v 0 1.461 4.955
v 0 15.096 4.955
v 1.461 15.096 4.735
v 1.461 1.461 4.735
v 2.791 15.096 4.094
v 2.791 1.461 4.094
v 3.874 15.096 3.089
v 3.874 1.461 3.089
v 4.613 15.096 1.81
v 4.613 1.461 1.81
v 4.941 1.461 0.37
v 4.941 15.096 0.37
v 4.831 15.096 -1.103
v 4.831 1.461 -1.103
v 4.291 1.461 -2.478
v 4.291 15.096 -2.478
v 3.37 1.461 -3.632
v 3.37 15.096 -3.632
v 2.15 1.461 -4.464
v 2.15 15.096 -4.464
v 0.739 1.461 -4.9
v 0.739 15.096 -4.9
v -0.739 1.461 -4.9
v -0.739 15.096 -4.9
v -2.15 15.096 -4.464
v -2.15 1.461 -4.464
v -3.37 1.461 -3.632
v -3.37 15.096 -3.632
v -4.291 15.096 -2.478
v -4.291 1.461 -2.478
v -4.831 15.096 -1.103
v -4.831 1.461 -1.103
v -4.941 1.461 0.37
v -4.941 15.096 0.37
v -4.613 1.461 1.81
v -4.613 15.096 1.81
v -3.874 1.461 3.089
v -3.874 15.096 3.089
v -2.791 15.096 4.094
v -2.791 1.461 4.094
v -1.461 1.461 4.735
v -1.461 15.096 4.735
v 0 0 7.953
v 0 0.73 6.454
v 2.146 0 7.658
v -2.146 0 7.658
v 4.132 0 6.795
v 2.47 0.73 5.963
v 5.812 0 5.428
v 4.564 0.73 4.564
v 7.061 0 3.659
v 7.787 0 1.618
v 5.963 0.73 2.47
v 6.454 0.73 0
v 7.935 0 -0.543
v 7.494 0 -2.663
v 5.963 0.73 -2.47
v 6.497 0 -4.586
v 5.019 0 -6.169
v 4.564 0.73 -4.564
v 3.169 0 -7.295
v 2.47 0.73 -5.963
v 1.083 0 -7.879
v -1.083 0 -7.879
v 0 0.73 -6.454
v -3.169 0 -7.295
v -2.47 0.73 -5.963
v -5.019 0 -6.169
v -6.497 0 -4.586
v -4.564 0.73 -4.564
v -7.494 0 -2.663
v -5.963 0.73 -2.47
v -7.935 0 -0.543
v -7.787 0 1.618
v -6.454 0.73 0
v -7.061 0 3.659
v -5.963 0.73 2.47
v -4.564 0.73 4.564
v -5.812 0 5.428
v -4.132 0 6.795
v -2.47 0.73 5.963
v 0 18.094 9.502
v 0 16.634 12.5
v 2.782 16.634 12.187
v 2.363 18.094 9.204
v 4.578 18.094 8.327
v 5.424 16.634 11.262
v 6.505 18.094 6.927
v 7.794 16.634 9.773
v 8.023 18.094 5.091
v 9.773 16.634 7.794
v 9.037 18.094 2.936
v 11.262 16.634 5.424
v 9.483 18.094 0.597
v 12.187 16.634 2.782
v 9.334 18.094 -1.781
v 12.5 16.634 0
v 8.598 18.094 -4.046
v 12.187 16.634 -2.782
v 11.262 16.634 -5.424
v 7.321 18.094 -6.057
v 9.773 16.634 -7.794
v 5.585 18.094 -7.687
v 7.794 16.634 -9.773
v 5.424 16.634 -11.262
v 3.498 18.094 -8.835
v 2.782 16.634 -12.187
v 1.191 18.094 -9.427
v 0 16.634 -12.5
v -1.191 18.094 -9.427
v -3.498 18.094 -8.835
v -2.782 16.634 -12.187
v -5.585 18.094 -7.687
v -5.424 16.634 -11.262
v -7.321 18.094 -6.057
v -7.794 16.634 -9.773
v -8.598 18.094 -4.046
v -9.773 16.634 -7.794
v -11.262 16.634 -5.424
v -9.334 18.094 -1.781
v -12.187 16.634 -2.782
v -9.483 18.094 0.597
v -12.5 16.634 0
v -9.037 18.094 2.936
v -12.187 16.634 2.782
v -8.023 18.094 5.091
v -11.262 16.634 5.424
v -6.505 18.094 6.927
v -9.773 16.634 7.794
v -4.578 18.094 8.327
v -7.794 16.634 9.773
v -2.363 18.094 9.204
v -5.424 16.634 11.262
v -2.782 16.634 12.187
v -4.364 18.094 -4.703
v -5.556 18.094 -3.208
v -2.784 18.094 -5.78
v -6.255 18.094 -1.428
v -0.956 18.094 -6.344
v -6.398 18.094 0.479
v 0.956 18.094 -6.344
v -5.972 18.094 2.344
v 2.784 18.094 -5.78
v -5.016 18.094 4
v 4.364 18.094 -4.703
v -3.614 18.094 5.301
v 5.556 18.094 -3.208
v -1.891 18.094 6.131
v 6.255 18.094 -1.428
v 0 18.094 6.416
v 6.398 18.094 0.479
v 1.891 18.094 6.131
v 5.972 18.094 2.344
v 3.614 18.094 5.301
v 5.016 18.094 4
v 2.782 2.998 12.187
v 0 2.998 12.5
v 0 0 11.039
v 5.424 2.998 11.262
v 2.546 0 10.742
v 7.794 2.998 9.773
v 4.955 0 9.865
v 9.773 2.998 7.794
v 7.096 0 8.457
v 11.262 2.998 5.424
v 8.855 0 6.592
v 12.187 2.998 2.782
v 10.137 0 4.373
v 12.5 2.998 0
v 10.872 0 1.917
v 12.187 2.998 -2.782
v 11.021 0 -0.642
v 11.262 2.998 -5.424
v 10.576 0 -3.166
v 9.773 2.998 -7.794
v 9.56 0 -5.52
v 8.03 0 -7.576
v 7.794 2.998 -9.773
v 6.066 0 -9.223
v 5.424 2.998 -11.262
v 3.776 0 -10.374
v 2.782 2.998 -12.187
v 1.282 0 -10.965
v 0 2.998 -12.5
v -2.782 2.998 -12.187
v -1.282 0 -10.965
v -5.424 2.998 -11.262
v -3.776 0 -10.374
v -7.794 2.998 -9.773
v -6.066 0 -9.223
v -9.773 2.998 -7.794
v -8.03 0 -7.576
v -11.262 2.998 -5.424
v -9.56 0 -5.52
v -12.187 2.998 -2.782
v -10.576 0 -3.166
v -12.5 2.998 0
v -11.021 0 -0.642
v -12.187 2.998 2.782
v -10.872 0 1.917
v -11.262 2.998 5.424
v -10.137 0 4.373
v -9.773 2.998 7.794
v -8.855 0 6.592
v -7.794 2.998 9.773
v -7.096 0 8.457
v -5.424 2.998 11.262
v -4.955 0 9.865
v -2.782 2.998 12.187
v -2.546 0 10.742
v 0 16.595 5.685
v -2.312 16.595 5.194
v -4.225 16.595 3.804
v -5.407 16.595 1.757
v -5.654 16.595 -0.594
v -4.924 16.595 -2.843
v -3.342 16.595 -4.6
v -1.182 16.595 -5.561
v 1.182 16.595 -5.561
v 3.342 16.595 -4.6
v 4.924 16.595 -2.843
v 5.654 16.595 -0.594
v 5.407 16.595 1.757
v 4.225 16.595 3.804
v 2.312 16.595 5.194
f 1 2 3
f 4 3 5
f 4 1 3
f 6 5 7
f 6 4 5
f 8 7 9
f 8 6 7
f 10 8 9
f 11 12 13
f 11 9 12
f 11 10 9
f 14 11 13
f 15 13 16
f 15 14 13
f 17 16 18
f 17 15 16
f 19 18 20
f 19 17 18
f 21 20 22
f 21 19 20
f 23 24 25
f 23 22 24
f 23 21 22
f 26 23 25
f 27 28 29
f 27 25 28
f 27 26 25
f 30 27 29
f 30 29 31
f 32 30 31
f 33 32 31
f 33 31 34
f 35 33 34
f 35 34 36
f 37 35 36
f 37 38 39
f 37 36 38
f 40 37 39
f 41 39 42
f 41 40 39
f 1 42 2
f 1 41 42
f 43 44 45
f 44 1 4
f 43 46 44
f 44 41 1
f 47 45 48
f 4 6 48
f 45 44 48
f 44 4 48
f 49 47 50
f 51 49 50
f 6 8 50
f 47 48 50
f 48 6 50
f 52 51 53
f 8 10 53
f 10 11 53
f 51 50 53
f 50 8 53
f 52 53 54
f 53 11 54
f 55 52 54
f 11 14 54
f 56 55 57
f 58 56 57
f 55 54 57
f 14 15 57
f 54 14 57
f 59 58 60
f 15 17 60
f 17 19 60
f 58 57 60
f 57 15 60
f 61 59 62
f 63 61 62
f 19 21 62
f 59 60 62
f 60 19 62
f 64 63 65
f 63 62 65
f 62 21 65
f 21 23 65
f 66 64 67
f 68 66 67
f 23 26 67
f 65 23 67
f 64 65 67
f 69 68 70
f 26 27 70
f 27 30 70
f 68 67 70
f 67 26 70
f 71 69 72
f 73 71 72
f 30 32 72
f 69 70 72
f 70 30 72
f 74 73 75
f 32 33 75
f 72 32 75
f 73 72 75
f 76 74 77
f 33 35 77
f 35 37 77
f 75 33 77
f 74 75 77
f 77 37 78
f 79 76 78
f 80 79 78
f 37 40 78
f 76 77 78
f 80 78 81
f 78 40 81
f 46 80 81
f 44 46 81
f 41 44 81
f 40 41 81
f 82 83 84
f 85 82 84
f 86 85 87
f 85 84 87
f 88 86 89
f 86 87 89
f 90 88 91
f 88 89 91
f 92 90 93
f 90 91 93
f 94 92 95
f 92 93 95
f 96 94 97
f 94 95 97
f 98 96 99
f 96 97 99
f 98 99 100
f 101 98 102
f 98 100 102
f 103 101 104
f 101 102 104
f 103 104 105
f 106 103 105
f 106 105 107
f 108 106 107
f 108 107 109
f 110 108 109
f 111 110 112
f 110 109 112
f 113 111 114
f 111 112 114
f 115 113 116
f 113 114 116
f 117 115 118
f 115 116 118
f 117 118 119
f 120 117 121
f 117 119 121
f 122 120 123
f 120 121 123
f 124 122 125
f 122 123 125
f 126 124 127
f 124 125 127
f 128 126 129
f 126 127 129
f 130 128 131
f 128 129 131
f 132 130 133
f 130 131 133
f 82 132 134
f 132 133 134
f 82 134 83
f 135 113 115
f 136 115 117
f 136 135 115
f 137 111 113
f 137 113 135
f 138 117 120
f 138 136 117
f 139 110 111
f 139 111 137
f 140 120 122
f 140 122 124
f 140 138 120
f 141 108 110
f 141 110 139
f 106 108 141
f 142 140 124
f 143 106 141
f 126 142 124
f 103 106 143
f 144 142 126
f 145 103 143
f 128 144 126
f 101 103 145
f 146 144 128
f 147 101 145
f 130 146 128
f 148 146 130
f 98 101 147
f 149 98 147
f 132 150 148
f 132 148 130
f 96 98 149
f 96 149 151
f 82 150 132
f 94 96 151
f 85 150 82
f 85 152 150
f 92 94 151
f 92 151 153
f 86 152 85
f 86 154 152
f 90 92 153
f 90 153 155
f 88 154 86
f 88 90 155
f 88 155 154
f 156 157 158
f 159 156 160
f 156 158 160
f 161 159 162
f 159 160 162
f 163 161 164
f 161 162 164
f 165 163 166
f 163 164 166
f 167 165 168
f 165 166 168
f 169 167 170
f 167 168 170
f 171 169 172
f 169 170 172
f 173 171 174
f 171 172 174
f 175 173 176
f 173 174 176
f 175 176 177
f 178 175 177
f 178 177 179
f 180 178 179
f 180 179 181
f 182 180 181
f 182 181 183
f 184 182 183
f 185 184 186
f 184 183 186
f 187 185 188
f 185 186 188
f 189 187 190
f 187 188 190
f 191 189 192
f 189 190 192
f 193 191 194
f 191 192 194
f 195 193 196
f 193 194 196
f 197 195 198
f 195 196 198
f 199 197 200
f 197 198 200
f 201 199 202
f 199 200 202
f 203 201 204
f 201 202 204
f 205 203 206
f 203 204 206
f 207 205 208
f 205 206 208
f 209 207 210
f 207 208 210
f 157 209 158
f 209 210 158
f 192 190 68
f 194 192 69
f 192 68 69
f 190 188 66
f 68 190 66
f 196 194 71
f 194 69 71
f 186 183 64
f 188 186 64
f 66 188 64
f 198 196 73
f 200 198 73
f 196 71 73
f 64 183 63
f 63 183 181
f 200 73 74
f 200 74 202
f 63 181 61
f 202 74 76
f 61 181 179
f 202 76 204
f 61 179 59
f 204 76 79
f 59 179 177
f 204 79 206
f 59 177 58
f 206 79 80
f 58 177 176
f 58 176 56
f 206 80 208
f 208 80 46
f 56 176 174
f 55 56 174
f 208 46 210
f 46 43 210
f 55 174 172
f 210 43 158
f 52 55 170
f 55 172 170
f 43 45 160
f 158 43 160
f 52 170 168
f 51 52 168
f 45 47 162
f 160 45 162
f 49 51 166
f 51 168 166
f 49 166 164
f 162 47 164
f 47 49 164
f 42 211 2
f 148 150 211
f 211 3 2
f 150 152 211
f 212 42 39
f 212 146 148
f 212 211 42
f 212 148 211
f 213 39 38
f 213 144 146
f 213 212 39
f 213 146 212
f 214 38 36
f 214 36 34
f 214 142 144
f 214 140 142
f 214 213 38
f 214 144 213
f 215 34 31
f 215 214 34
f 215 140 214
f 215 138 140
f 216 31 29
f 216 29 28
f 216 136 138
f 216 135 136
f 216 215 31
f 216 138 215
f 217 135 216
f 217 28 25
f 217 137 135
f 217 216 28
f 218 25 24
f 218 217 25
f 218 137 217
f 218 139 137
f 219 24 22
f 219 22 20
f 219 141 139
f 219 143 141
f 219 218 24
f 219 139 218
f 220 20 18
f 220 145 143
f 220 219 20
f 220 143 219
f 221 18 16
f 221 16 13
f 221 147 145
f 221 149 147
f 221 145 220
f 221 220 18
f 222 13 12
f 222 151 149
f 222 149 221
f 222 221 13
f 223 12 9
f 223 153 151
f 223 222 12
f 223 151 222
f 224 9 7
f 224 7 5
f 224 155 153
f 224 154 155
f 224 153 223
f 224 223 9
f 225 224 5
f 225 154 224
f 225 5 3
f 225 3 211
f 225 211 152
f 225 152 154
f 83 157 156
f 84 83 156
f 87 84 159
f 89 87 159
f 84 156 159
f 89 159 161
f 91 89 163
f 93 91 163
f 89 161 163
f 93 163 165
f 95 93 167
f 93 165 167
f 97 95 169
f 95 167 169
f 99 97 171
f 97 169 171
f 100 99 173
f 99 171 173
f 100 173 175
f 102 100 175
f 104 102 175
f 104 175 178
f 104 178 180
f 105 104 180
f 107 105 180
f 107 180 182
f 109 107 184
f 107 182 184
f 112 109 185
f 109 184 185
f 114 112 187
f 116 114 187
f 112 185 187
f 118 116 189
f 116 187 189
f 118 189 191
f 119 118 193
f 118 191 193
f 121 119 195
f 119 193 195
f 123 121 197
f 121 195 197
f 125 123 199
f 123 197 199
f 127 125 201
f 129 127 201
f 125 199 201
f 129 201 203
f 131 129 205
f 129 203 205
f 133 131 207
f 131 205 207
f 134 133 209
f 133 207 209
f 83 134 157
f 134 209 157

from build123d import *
from OCP.BRepFilletAPI import BRepFilletAPI_MakeChamfer

# Parameters (mm, degrees)
SKETCH1_R           = 12.5
BOSS_EXTRUDE1_DEPTH = 18.094022058
SKETCH2_R           = 4.955152252
CUT_EXTRUDE1_DEPTH  = 26.296118956
CHAMFER1_SIZE       = 1.460521096
CHAMFER1_SIZE2      = 2.997964707


with BuildPart() as part:
    # Sketch1 → Boss-Extrude1 (new body)
    with BuildSketch(Plane(origin=(0, 0, 0), x_dir=(1, 0, 0), z_dir=(0, 1, 0))):
        Circle(SKETCH1_R)
    extrude(amount=BOSS_EXTRUDE1_DEPTH)

    # Sketch2 → Cut-Extrude1 (cut, through all)
    with BuildSketch(Plane(origin=(0, 0, 0), x_dir=(1, 0, 0), z_dir=(0, 1, 0))):
        Circle(SKETCH2_R)
    extrude(amount=CUT_EXTRUDE1_DEPTH, mode=Mode.SUBTRACT)

    # Chamfer1: one chamfer whose edges measure the first distance from different faces: ONE call of the kernel's chamfer builder (chamfer() names one face for all edges)
    chamfer1_edges_1 = [part.edges().sort_by_distance(p)[0] for p in [
        (-4.955152252, 18.094022058, 0),
    ]]
    chamfer1_side_1 = [part.faces().sort_by_distance(p)[0] for p in [
        (-12.146446609, 18.094022058, 0),
    ]]
    chamfer1_edges_2 = [part.edges().sort_by_distance(p)[0] for p in [
        (-4.955152252, 0, 0),
    ]]
    chamfer1_side_2 = [part.faces().sort_by_distance(p)[0] for p in [
        (-4.955152252, 9.047011029, 0),
    ]]
    chamfer1_edges_3 = [part.edges().sort_by_distance(p)[0] for p in [
        (-12.5, 0, 0),
    ]]
    chamfer1_side_3 = [part.faces().sort_by_distance(p)[0] for p in [
        (-12.146446609, 0, 0),
    ]]
    chamfer1_edges_4 = [part.edges().sort_by_distance(p)[0] for p in [
        (-12.5, 18.094022058, 0),
    ]]
    chamfer1_side_4 = [part.faces().sort_by_distance(p)[0] for p in [
        (-12.5, 9.047011029, 0),
    ]]
    chamfer1 = BRepFilletAPI_MakeChamfer(part.part.solid().wrapped)
    for e in chamfer1_edges_1:
        chamfer1.Add(CHAMFER1_SIZE, CHAMFER1_SIZE2, e.wrapped, chamfer1_side_1[0].wrapped)  # the first distance lies on this face
    for e in chamfer1_edges_2:
        chamfer1.Add(CHAMFER1_SIZE, CHAMFER1_SIZE2, e.wrapped, chamfer1_side_2[0].wrapped)  # the first distance lies on this face
    for e in chamfer1_edges_3:
        chamfer1.Add(CHAMFER1_SIZE, CHAMFER1_SIZE2, e.wrapped, chamfer1_side_3[0].wrapped)  # the first distance lies on this face
    for e in chamfer1_edges_4:
        chamfer1.Add(CHAMFER1_SIZE, CHAMFER1_SIZE2, e.wrapped, chamfer1_side_4[0].wrapped)  # the first distance lies on this face
    add(Compound.cast(chamfer1.Shape()), mode=Mode.REPLACE)


solid = part.part
